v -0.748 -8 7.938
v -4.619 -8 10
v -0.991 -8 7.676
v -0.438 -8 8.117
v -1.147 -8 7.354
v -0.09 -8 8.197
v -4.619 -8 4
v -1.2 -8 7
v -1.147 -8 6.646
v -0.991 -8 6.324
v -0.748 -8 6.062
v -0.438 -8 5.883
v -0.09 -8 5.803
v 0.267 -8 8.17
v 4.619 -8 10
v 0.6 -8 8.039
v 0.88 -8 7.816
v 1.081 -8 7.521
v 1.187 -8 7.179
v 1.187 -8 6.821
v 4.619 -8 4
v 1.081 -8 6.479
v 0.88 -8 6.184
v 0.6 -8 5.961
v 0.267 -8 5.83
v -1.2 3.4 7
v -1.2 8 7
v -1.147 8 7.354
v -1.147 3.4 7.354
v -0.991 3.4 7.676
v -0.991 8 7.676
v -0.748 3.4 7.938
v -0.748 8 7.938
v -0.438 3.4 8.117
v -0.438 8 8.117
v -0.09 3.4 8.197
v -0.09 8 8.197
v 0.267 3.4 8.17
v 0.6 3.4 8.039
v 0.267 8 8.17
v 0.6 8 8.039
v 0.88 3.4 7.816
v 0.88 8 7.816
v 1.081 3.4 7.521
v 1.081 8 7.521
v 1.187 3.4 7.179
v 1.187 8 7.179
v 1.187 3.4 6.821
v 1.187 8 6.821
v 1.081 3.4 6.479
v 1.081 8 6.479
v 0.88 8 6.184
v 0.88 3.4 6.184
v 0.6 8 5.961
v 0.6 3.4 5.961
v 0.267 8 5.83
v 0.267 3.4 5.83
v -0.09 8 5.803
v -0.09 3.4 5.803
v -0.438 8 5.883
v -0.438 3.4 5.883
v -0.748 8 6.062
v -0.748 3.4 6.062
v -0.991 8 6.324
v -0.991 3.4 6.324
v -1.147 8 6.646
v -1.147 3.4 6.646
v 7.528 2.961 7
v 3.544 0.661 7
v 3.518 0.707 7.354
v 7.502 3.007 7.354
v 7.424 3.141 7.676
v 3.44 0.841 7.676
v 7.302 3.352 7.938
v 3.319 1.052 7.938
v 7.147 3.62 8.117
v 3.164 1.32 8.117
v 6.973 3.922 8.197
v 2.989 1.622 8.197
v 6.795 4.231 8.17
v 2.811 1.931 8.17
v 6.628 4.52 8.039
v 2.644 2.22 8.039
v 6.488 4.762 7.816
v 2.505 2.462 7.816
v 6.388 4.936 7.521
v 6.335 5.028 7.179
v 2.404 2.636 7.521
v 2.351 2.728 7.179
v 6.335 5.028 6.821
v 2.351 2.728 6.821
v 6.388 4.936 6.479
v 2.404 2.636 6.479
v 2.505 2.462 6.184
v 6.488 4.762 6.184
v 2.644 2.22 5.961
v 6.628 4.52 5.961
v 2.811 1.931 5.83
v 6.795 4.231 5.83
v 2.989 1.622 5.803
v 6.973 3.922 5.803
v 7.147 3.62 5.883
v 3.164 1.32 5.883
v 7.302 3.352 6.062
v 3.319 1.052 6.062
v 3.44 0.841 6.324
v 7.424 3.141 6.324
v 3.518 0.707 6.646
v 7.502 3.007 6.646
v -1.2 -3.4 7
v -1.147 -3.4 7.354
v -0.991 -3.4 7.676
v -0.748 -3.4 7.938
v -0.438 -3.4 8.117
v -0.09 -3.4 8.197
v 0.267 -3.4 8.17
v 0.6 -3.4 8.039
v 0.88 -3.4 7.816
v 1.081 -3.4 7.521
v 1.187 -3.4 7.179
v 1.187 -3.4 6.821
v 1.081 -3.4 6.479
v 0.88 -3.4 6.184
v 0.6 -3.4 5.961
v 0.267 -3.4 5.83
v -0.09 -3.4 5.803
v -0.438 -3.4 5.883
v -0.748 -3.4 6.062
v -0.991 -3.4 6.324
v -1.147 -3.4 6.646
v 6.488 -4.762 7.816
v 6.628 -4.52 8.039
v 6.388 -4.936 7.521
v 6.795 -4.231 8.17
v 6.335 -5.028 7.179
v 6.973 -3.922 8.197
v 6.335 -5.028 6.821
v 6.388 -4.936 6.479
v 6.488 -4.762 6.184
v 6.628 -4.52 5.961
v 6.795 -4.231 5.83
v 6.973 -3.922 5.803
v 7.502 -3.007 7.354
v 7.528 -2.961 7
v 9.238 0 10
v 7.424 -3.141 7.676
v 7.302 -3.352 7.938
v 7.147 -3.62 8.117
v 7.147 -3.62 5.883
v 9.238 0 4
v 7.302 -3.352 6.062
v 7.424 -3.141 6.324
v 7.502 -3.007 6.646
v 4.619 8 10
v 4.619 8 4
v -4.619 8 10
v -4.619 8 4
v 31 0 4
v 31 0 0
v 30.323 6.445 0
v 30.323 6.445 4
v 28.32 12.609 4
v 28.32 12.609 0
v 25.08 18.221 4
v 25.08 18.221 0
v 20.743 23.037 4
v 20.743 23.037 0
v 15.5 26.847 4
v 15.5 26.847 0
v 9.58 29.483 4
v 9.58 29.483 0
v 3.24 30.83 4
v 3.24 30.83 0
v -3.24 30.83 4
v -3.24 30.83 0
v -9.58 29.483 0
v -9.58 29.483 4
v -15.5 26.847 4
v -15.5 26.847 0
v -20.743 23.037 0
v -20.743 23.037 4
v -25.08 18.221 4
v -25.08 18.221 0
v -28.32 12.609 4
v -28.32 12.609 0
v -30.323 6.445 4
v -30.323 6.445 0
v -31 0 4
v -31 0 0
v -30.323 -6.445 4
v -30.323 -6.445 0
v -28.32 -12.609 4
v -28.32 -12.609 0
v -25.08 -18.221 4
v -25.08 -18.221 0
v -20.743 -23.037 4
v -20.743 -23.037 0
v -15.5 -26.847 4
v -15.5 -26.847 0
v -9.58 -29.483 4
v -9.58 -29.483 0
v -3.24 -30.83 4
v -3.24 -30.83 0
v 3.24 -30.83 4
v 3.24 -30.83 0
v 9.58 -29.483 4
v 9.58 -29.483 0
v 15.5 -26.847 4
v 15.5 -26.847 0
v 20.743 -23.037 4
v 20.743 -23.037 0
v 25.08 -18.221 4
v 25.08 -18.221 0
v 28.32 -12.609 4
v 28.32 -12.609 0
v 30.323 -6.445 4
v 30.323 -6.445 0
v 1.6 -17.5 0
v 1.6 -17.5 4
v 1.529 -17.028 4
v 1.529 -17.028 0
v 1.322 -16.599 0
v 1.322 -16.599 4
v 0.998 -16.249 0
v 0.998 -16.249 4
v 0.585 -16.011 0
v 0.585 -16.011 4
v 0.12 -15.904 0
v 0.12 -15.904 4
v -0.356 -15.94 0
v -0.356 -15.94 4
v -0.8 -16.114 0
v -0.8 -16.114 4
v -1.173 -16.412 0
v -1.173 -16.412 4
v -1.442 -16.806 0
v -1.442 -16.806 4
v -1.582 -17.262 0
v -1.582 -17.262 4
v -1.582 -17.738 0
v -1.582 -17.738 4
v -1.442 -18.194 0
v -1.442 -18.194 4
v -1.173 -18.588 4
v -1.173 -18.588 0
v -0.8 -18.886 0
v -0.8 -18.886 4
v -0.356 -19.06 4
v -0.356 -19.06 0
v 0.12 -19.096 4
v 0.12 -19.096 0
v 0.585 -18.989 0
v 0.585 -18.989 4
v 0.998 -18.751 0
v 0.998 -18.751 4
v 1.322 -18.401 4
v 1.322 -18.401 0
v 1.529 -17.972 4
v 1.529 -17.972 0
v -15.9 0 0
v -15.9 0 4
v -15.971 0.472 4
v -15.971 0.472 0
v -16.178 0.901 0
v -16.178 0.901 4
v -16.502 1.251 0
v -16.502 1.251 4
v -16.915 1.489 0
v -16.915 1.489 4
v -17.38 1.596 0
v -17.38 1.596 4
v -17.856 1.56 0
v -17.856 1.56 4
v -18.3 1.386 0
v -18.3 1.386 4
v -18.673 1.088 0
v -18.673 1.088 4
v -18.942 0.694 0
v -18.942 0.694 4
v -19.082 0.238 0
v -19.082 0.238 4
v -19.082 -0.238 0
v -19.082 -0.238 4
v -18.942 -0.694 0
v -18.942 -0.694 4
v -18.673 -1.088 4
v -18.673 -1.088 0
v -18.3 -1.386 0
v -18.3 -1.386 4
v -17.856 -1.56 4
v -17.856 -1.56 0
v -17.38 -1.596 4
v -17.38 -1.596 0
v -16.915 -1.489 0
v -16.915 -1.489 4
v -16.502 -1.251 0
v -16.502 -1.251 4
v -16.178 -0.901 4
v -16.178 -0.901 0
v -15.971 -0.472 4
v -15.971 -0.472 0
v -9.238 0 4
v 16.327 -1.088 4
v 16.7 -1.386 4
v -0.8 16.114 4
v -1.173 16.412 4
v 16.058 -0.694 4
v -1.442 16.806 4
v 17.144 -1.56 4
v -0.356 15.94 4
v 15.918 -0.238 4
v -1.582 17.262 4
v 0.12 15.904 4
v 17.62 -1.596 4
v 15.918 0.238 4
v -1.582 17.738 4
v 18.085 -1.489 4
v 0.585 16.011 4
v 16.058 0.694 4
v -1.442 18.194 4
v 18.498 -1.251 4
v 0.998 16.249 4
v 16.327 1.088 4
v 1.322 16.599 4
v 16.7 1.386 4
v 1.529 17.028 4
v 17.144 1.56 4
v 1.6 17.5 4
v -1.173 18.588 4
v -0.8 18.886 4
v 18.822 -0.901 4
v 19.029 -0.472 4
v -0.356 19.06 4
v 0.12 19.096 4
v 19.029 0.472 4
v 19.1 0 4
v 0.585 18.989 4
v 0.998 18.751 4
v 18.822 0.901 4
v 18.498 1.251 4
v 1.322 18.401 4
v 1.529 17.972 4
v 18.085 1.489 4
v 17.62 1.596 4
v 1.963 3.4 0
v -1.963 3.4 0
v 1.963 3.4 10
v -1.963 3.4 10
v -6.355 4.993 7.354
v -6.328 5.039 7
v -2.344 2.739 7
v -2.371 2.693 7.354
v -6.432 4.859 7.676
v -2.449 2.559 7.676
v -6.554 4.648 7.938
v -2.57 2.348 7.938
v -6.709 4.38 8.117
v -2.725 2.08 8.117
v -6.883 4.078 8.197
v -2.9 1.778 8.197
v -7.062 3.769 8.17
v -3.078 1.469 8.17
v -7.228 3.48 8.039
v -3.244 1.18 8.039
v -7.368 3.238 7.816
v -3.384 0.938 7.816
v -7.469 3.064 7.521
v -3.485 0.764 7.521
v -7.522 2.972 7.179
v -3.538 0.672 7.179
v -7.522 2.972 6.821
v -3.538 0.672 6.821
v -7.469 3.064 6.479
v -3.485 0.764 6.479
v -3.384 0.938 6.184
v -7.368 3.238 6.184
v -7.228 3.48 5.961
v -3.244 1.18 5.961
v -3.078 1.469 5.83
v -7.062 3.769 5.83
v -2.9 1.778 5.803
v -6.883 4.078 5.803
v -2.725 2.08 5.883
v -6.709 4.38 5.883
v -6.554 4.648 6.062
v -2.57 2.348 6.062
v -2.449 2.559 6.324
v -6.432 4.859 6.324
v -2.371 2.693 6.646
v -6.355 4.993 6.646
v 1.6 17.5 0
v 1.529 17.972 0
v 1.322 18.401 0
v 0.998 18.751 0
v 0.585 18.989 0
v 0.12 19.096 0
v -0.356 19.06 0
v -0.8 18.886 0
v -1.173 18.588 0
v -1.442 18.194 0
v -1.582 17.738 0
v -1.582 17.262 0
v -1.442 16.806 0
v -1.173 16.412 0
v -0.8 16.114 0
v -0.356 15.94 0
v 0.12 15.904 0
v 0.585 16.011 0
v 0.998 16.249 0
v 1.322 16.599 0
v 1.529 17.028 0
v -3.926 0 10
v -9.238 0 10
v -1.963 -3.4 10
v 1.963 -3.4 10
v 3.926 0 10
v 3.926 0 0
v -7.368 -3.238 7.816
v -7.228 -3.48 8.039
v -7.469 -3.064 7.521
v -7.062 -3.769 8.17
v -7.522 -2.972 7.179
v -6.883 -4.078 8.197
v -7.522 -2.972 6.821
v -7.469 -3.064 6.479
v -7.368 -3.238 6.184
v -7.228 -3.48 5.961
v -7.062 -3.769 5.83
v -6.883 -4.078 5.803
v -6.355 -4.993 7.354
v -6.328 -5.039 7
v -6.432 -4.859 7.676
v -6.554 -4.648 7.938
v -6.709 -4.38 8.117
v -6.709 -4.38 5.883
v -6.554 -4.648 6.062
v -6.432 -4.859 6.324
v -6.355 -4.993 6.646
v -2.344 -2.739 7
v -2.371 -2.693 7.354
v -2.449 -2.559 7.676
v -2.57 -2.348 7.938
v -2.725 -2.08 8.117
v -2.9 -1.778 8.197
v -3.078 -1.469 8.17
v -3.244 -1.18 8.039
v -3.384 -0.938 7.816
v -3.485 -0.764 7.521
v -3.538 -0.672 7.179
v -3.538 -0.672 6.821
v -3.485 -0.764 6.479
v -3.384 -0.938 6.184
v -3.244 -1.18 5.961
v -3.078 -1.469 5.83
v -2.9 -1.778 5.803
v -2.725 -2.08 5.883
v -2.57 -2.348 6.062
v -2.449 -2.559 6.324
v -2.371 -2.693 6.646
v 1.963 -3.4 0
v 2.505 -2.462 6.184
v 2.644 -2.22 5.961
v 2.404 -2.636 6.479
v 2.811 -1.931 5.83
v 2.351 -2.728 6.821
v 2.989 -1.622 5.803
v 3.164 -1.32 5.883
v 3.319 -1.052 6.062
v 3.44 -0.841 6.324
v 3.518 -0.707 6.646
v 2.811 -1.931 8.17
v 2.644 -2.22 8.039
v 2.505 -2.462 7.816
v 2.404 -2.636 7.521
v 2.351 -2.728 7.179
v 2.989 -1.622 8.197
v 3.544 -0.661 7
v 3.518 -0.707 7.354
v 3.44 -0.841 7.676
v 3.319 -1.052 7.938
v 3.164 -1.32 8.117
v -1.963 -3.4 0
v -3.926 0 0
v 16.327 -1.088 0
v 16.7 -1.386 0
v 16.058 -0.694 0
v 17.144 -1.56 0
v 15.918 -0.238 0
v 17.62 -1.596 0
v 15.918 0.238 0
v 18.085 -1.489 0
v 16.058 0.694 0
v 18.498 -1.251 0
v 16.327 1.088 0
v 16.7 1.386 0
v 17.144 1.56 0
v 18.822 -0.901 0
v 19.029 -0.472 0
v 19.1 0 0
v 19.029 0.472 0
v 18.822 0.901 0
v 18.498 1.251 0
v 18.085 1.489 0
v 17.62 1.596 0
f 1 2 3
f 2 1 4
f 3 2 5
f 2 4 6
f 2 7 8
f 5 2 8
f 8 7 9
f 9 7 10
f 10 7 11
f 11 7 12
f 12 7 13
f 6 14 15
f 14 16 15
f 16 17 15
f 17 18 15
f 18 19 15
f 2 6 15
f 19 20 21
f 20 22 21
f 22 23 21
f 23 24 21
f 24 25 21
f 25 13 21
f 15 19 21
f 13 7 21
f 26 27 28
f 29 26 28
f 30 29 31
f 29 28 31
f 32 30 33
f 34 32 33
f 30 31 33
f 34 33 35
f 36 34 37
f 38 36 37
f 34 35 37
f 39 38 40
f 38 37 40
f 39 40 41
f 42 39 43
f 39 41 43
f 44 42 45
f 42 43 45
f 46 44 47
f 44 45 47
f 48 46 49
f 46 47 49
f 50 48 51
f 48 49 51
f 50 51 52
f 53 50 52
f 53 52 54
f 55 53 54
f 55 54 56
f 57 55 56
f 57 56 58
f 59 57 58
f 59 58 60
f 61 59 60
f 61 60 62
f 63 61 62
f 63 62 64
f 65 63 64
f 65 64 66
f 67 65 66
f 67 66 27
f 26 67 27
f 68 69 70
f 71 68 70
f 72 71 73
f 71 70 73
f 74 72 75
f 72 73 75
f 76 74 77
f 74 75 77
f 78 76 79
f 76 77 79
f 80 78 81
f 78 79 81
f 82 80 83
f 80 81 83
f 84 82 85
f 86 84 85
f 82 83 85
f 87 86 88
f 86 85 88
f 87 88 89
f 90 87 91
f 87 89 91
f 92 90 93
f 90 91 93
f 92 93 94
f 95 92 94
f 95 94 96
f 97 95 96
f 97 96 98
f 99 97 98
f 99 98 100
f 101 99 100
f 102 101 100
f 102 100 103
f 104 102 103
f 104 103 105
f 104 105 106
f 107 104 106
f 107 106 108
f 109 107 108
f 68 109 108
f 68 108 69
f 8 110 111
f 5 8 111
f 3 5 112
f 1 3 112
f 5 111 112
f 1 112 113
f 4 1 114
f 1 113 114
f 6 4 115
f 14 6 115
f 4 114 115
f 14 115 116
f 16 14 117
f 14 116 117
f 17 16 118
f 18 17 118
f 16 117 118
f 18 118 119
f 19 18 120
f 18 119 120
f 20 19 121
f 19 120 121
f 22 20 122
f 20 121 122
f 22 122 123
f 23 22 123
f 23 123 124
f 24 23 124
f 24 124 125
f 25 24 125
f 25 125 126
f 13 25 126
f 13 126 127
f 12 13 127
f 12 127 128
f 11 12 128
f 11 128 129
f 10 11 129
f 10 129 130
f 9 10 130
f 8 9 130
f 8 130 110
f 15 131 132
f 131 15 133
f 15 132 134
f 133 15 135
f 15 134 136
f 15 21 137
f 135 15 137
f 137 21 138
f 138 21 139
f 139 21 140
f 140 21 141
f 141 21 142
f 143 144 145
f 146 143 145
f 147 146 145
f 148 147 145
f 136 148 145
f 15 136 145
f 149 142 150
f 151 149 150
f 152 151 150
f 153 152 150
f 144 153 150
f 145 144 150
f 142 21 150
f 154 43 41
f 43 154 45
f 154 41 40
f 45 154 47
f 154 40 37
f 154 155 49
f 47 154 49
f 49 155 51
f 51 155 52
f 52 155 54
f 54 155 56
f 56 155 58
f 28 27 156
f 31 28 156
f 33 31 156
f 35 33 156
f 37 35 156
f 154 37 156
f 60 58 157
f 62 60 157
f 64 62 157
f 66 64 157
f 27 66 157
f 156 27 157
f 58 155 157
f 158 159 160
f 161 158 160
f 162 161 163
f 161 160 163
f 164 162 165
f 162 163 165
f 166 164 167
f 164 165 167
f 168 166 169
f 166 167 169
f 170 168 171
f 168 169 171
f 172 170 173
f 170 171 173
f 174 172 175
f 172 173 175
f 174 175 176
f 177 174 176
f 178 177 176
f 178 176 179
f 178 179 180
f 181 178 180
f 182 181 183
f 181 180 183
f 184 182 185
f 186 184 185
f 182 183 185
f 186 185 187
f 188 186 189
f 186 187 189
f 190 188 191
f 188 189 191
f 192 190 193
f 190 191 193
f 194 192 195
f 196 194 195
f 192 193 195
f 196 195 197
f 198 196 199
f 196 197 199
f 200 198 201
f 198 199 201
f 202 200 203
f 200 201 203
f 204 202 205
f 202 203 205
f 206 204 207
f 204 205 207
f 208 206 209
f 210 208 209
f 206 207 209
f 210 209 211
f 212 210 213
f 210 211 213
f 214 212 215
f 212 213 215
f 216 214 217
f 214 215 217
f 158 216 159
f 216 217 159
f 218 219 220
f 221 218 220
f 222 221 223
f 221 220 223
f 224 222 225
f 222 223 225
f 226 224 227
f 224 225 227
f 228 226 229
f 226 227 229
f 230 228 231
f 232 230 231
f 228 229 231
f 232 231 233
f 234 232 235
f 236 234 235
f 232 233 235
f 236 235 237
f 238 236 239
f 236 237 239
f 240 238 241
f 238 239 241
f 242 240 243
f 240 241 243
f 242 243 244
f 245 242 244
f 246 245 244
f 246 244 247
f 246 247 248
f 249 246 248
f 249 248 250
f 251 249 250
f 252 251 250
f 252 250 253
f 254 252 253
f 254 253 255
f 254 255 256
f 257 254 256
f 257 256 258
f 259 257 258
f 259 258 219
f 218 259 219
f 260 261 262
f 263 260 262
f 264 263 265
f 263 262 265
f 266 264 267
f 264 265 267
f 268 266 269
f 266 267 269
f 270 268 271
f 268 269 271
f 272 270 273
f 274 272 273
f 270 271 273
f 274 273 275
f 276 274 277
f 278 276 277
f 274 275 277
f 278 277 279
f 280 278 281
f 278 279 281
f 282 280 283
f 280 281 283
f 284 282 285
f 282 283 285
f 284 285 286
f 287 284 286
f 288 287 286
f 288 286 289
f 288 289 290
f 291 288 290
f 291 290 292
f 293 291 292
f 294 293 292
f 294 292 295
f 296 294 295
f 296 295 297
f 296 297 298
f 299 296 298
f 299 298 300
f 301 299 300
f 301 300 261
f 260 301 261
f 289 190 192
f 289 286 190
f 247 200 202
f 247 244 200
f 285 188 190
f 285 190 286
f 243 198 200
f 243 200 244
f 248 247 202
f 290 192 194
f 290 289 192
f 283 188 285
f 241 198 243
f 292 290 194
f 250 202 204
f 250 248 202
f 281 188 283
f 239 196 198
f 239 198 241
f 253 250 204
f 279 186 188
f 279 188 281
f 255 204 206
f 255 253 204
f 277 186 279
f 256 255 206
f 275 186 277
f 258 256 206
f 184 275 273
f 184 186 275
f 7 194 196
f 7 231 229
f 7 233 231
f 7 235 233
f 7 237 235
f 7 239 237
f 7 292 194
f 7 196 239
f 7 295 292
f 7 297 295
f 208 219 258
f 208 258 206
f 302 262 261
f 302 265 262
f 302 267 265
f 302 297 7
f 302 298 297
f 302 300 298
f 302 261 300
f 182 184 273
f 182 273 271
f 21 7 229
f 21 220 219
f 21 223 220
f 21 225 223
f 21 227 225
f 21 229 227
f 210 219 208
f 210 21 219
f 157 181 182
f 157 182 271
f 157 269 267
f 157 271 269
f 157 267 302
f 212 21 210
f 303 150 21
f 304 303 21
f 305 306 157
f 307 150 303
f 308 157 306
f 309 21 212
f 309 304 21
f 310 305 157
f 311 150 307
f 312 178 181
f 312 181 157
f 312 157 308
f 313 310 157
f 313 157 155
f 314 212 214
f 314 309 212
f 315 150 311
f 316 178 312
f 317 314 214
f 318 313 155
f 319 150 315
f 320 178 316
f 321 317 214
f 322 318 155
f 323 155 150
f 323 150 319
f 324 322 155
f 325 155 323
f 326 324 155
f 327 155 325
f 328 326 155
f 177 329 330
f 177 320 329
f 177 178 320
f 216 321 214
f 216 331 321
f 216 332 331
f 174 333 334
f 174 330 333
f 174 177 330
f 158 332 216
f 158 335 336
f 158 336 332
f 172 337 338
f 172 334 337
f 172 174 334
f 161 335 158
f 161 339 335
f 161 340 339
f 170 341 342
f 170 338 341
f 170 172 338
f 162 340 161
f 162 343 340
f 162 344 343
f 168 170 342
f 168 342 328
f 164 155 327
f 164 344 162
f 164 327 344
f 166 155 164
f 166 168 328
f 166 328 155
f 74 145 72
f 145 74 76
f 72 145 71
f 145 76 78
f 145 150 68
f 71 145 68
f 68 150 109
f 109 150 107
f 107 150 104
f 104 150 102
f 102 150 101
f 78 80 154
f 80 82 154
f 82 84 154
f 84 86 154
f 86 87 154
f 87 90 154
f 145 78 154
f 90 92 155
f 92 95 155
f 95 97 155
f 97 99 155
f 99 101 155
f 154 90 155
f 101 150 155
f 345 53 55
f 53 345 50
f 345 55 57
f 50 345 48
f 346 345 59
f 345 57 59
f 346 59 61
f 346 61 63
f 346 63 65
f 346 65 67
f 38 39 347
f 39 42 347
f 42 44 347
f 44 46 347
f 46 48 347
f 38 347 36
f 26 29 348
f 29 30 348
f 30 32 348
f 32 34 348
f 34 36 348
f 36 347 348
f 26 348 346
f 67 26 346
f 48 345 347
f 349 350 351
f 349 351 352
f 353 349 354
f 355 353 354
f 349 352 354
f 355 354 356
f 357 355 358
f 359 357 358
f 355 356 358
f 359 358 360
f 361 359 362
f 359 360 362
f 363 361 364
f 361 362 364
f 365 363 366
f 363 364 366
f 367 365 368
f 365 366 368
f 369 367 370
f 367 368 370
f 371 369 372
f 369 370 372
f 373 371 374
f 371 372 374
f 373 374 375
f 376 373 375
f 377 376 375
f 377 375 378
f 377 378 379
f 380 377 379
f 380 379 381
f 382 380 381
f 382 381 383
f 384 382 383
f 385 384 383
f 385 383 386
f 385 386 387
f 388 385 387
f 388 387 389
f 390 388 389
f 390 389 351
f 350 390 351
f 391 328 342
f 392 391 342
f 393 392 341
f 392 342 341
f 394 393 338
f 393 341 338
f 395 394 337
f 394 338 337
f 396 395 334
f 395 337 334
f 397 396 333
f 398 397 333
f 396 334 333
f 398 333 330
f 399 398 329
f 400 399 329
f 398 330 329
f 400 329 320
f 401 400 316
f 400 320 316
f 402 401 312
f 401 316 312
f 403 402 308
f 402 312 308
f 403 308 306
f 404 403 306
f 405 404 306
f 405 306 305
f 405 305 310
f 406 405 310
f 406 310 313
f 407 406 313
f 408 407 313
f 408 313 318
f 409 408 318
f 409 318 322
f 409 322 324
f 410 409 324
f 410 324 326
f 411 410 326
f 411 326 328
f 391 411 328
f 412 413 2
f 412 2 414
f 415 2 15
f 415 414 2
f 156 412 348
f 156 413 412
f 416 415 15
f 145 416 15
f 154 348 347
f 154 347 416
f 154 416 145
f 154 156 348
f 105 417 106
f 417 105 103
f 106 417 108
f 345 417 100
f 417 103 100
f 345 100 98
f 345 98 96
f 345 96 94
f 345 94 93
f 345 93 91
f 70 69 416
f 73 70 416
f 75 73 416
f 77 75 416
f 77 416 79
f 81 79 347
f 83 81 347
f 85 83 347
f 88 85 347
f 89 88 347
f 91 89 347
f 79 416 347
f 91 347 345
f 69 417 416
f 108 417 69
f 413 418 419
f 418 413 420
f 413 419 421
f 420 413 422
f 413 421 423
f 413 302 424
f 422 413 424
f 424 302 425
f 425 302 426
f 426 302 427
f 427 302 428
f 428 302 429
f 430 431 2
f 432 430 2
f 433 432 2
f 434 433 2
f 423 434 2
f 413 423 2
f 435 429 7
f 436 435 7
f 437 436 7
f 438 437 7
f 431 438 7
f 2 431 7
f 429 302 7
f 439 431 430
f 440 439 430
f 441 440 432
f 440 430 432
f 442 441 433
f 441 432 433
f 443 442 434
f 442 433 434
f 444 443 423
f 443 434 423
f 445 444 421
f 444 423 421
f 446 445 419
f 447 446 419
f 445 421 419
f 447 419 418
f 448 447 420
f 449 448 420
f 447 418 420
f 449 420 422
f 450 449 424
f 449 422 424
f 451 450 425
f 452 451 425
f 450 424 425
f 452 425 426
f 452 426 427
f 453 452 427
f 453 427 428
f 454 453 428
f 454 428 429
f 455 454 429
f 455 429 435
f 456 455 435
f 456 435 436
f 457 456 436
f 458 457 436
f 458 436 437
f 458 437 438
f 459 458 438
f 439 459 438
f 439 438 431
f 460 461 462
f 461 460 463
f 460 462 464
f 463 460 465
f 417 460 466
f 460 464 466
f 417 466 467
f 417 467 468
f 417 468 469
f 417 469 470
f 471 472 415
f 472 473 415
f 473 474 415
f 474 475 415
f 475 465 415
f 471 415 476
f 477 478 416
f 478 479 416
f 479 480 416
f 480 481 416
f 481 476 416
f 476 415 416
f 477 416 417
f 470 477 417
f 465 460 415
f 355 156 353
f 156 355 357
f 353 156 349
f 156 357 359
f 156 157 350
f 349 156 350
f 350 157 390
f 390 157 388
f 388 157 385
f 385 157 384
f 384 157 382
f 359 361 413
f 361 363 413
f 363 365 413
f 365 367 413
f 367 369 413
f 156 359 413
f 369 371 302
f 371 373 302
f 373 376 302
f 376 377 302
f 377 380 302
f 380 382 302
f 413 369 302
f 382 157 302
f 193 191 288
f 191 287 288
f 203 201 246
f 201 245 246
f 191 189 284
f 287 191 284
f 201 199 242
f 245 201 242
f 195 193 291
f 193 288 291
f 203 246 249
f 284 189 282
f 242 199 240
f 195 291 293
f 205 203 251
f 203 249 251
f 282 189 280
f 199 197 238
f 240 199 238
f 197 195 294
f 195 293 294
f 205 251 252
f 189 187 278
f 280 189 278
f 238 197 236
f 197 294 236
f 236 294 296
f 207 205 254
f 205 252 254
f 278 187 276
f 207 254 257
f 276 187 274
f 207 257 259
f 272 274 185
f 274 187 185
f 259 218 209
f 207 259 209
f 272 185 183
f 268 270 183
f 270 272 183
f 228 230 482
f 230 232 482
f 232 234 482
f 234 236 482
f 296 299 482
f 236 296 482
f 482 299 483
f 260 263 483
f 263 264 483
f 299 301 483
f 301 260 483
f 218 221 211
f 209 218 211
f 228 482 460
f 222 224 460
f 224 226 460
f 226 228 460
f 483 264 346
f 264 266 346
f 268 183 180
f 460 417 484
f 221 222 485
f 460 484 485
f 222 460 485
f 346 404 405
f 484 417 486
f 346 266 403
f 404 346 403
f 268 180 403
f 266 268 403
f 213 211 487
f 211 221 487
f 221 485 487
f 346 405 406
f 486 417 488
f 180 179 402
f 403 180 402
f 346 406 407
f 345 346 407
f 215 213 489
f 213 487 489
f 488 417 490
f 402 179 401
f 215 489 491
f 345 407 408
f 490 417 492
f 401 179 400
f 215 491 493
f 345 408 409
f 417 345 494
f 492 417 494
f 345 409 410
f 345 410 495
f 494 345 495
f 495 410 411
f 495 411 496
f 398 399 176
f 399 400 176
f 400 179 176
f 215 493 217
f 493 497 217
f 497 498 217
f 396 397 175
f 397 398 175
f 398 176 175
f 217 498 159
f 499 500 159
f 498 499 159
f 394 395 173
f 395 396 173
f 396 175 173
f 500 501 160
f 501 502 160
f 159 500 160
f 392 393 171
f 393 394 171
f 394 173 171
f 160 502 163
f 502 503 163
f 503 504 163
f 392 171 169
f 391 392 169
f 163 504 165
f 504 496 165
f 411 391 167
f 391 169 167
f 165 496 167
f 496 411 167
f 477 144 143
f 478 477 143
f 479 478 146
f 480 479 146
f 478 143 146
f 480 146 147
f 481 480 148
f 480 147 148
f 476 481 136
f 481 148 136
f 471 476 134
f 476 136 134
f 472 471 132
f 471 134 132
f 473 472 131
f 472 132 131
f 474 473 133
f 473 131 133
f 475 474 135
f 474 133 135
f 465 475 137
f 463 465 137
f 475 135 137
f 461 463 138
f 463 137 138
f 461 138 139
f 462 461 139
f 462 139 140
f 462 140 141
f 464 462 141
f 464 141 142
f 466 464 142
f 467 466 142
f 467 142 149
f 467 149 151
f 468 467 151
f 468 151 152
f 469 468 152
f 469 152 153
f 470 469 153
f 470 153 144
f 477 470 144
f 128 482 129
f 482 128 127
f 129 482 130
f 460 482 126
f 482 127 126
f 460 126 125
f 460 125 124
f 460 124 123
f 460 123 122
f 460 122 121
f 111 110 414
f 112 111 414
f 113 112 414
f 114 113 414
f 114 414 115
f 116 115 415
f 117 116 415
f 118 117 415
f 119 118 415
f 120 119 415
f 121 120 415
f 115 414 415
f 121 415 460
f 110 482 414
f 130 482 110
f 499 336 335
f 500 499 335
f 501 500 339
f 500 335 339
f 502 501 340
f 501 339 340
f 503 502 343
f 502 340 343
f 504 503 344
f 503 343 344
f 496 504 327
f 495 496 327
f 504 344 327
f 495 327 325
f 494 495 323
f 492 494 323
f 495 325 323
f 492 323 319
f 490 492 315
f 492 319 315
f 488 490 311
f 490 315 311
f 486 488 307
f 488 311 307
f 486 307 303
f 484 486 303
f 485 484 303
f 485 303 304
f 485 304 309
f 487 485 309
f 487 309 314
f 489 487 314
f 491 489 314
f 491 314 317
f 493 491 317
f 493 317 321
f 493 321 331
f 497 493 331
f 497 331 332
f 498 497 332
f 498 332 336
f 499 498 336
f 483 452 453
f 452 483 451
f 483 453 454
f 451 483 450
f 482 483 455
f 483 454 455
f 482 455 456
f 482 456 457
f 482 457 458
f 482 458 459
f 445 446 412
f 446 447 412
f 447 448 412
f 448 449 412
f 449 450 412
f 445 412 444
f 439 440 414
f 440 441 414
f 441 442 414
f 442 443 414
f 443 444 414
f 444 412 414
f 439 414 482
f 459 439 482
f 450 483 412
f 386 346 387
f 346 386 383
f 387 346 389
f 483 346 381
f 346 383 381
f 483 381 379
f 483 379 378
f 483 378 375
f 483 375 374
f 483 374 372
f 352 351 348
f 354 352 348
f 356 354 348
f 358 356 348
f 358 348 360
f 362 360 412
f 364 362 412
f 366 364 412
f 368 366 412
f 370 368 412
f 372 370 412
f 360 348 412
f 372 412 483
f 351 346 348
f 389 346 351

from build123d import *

# Parameters (mm, degrees)
SZKIC1_R                    = 31
DODANIE_WYCI_GNI_CIE1_DEPTH = 4
DODANIE_WYCI_GNI_CIE2_DEPTH = 6
SZKIC3_R                    = 1.2
WYTNIJ_WYCI_GNI_CIE1_DEPTH  = 51.813384064
SZYK_KO_OWY1_COUNT          = 3
SZKIC4_R                    = 1.6
WYTNIJ_WYCI_GNI_CIE2_DEPTH  = 6
WYTNIJ_WYCI_GNI_CIE3_DEPTH  = 45.24929378


with BuildPart() as part:
    # Szkic1 → Dodanie-wyciągnięcie1 (new body)
    with BuildSketch(Plane.XY):
        Circle(SZKIC1_R)
    extrude(amount=DODANIE_WYCI_GNI_CIE1_DEPTH)

    # Szkic2 → Dodanie-wyciągnięcie2 (add)
    with BuildSketch(Plane.XY.offset(4)):
        Polygon((4.618802154, 8), (-4.618802154, 8), (-9.237604307, 0), (-4.618802154, -8), (4.618802154, -8), (9.237604307, 0), align=None)
        Polygon((1.962990915, 3.4), (-1.962990915, 3.4), (-3.92598183, 0), (-1.962990915, -3.4), (1.962990915, -3.4), (3.92598183, 0), align=None, mode=Mode.SUBTRACT)
    extrude(amount=DODANIE_WYCI_GNI_CIE2_DEPTH)

    # Szkic3 → Wytnij-wyciągnięcie1 (cut, through all)
    with BuildSketch(Plane(origin=(0, 8, 0), x_dir=(1, 0, 0), z_dir=(0, 1, 0))):
        with Locations(Location((0, -7, 0), (0, 0, 180))):
            Circle(SZKIC3_R)
    wytnij_wyci_gni_cie1 = extrude(amount=-WYTNIJ_WYCI_GNI_CIE1_DEPTH, mode=Mode.SUBTRACT)

    # Szyk kołowy1: Wytnij-wyciągnięcie1 ×3 about axis
    szyk_ko_owy1_axis = Axis((0, 0, 4), (0, 0, 1))
    for i in range(1, SZYK_KO_OWY1_COUNT):
        add(wytnij_wyci_gni_cie1.rotate(szyk_ko_owy1_axis, i * 360 / SZYK_KO_OWY1_COUNT), mode=Mode.SUBTRACT)

    # Szkic4 → Wytnij-wyciągnięcie2 (cut)
    with BuildSketch(Plane.XY.offset(4)):
        with Locations((0, 17.5)):
            Circle(SZKIC4_R)
        with Locations((17.5, 0)):
            Circle(SZKIC4_R)
        with Locations((0, -17.5)):
            Circle(SZKIC4_R)
        with Locations((-17.5, 0)):
            Circle(SZKIC4_R)
    extrude(amount=-WYTNIJ_WYCI_GNI_CIE2_DEPTH, mode=Mode.SUBTRACT)

    # Szkic5 → Wytnij-wyciągnięcie3 (cut, through all)
    with BuildSketch(Plane.XY.offset(4)):
        Polygon((3.92598183, 0), (1.962990915, 3.4), (-1.962990915, 3.4), (-3.92598183, 0), (-1.962990915, -3.4), (1.962990915, -3.4), align=None)
    extrude(amount=-WYTNIJ_WYCI_GNI_CIE3_DEPTH, mode=Mode.SUBTRACT)


solid = part.part
